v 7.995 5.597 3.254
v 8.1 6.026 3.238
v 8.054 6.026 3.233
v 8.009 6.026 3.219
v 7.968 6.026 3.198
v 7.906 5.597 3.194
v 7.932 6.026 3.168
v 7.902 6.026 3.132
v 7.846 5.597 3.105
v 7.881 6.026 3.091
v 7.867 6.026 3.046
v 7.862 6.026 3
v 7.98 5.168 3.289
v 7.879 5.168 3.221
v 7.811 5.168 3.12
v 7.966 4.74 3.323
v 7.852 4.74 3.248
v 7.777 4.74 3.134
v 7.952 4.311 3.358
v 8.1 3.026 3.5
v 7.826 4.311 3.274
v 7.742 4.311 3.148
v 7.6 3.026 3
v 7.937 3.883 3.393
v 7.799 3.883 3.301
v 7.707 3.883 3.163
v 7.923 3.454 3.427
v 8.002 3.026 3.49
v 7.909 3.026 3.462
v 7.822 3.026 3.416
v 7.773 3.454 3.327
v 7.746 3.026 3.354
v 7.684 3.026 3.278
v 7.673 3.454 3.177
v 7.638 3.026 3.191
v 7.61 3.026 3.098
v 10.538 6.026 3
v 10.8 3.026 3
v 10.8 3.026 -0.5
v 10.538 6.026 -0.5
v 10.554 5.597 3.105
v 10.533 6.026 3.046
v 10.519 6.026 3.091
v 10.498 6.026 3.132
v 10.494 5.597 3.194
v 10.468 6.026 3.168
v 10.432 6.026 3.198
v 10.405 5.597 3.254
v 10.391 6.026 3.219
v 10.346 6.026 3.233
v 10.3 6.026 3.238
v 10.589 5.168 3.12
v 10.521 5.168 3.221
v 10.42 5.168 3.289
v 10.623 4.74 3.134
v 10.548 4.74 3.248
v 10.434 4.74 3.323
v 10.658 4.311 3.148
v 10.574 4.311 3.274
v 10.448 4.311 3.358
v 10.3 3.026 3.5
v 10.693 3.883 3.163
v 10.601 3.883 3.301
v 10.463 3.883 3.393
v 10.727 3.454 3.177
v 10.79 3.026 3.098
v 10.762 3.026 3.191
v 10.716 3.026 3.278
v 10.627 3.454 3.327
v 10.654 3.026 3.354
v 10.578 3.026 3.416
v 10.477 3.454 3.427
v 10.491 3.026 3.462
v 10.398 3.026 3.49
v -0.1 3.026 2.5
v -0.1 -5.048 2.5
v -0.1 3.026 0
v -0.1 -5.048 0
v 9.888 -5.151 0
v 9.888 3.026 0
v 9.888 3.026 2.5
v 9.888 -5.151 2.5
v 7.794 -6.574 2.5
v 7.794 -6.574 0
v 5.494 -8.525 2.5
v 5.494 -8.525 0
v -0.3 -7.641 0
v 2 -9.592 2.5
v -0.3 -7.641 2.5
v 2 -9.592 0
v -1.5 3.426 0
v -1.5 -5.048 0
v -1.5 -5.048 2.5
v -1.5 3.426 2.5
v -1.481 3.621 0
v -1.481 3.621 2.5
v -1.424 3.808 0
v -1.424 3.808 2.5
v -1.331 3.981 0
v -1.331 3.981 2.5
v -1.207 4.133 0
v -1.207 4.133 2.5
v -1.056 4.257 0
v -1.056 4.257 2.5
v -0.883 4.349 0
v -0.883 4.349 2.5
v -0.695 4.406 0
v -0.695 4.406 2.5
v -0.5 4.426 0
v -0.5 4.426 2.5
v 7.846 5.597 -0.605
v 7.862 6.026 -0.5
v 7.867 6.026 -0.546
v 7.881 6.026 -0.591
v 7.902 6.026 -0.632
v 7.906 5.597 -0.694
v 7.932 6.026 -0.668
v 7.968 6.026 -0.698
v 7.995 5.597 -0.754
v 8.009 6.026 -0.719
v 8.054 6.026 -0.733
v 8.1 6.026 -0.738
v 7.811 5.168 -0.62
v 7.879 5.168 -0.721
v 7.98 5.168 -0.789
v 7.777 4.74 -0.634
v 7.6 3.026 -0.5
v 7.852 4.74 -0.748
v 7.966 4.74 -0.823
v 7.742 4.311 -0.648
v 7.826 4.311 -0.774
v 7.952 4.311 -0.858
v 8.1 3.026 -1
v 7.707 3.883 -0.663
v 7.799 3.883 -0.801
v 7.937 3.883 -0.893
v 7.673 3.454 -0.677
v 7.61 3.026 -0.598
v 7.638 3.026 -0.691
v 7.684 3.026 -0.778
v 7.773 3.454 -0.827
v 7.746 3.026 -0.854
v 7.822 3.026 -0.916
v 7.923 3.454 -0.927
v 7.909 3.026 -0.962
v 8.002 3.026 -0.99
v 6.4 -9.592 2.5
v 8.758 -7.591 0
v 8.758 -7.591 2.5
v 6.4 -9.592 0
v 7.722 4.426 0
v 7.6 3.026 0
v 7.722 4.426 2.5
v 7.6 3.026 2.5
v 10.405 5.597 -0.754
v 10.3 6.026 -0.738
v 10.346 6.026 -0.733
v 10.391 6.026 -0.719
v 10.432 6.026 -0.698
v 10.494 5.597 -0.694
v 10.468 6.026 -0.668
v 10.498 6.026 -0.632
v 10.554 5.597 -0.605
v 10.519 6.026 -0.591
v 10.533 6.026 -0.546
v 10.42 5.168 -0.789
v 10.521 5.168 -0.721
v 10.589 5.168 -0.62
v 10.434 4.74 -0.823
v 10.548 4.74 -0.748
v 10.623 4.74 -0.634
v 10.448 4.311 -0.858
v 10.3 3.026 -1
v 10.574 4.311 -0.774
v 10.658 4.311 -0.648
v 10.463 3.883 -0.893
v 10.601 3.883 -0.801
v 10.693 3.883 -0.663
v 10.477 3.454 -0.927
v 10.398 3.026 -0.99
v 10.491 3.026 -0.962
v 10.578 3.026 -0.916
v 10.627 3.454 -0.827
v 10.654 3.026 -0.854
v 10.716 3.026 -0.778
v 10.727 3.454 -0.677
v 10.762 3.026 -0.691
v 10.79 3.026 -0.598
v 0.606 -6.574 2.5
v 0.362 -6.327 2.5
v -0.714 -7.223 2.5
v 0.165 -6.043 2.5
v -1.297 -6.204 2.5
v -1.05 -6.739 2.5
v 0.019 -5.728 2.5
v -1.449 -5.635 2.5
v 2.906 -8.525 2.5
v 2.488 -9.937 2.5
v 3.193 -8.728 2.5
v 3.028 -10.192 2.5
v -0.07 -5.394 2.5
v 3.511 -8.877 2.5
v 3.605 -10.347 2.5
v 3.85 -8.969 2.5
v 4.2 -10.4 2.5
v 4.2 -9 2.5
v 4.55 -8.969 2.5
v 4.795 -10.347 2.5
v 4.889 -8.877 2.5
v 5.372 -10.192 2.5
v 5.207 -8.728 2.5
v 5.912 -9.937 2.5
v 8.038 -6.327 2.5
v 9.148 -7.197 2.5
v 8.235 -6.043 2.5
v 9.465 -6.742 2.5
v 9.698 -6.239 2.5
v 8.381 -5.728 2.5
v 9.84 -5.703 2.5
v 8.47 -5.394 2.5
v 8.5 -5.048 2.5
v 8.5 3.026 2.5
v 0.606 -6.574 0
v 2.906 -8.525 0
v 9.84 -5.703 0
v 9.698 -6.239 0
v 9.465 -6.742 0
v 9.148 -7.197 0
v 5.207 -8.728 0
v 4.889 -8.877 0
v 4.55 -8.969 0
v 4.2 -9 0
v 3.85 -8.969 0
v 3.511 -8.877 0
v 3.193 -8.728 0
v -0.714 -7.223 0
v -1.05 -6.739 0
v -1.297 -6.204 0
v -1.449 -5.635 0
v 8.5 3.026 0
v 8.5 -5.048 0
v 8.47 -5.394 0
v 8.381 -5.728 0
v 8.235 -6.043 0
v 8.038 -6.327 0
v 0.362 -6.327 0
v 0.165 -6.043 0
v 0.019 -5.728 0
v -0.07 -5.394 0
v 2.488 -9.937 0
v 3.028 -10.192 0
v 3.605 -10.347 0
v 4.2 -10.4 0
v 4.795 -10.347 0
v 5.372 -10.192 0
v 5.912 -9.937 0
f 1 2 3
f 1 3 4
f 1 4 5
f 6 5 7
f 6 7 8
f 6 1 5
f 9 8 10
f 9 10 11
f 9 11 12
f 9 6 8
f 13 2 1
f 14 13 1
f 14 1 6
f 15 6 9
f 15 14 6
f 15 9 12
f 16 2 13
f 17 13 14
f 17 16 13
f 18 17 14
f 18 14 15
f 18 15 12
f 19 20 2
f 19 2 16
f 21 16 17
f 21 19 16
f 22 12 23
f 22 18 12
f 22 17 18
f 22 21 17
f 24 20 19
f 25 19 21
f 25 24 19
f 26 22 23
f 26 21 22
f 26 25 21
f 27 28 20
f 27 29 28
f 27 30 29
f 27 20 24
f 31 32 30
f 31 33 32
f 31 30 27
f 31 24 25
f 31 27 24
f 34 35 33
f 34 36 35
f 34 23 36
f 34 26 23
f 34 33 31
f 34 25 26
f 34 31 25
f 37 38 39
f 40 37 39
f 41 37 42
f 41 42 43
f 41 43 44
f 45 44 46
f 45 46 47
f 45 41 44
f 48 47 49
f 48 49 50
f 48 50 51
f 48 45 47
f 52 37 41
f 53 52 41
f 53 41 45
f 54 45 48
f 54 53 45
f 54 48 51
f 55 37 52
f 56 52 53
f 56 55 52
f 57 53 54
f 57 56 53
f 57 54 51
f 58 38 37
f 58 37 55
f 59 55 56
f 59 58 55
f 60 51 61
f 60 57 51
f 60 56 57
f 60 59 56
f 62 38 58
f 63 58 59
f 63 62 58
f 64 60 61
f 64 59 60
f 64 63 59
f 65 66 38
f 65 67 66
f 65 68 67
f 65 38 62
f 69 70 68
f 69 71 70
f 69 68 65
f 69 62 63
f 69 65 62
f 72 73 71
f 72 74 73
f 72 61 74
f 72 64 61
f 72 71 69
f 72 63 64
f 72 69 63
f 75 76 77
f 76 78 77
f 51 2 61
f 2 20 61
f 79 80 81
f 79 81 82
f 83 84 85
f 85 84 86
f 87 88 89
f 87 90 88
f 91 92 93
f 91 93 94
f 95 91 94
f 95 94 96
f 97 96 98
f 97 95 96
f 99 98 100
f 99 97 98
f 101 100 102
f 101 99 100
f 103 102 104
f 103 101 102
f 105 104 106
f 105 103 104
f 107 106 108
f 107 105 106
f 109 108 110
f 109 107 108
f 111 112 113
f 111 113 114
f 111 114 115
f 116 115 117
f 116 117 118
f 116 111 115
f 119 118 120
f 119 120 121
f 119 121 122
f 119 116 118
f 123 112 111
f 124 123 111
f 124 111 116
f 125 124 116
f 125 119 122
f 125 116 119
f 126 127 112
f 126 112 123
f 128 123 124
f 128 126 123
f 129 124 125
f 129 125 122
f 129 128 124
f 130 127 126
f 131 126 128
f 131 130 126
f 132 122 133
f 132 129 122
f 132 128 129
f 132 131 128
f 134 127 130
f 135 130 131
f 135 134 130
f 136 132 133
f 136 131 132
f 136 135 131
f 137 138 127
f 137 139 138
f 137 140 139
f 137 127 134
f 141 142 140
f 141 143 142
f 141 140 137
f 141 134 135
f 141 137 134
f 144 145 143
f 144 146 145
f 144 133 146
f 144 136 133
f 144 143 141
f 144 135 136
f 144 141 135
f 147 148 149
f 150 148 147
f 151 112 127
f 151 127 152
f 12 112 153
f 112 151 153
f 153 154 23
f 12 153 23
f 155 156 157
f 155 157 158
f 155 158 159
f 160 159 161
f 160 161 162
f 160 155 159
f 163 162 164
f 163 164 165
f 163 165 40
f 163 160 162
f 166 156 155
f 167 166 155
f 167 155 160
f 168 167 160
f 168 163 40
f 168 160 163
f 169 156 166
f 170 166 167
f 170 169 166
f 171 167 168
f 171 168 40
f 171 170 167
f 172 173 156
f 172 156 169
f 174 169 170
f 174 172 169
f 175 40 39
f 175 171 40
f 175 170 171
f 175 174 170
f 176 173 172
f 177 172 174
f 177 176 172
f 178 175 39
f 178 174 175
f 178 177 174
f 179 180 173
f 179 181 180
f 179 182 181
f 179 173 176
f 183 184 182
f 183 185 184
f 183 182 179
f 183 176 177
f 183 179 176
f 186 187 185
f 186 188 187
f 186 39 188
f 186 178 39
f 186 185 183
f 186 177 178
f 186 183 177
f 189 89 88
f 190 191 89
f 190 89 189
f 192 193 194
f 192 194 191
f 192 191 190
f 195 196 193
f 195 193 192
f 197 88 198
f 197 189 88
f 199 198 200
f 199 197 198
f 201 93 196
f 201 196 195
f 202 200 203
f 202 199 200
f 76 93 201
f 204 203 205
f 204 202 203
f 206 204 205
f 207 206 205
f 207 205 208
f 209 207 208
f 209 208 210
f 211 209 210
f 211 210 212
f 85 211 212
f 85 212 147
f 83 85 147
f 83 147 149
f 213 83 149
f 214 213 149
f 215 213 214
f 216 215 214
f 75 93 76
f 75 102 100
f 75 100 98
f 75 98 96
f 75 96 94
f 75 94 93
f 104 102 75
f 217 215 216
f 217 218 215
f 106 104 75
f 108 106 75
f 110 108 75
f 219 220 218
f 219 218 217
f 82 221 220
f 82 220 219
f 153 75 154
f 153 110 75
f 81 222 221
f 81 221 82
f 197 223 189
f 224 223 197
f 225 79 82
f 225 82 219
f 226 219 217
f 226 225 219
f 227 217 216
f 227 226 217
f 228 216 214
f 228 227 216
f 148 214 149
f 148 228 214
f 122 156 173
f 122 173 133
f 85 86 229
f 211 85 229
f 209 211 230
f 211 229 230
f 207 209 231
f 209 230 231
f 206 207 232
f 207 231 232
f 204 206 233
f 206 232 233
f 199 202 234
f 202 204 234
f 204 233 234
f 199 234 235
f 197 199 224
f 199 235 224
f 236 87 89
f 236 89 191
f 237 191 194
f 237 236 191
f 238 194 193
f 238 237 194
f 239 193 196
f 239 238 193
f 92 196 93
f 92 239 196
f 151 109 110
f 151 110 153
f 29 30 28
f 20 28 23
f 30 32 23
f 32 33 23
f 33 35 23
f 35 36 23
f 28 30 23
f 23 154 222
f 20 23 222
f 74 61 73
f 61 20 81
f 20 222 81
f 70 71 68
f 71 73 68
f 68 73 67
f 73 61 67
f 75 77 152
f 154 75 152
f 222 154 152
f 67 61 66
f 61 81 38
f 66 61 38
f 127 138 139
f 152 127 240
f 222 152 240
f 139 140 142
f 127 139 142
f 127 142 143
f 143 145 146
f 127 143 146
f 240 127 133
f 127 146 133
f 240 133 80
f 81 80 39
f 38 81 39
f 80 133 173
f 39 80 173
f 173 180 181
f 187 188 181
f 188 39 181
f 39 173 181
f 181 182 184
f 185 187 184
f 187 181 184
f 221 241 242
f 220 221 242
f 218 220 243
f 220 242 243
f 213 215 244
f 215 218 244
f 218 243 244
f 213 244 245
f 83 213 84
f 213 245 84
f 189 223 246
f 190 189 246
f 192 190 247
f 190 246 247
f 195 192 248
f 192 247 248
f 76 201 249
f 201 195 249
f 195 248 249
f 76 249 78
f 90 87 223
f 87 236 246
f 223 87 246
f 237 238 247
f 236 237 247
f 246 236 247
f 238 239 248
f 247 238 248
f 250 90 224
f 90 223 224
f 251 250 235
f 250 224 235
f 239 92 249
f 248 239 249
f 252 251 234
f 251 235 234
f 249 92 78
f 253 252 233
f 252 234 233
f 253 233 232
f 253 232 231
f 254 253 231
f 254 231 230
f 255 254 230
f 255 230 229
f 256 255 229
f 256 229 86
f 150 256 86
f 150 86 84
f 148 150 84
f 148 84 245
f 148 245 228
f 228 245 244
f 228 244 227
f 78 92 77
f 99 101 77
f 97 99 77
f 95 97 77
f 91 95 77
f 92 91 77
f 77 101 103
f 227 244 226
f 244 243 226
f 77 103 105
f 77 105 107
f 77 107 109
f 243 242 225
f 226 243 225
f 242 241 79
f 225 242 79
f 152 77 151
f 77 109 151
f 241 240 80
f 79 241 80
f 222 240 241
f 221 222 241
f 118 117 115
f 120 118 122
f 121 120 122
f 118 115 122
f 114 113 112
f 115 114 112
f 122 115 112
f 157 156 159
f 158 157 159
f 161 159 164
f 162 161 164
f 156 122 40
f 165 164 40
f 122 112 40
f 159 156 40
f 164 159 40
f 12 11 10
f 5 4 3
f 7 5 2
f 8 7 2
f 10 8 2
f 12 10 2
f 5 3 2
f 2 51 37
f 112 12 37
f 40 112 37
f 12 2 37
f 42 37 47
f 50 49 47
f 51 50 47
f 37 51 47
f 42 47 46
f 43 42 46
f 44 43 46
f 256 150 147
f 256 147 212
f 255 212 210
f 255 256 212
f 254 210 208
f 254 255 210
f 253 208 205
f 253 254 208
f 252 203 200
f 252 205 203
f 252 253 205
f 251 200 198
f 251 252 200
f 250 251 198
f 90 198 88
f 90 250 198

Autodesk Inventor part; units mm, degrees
ref_plane "YZ Plane" through (0, 0, 0) normal (1, 0, 0) x (0, 1, 0)
ref_plane "XZ Plane" through (0, 0, 0) normal (0, 1, 0) x (-1, 0, 0)
ref_plane "XY Plane" through (0, 0, 0) normal (0, 0, 1) x (1, 0, 0)
sketch "Sketch1" plane through (0, 0, 0) normal (0, 0, 1) x (1, 0, 0)
  line L0 (-0.1, 3.0255) -> (8.5, 3.0255)
  line L1 (8.5, 3.0255) -> (8.5, -5.0485)
  line L2 (-0.1, -5.0485) -> (-0.1, 3.0255)
  arc A0 (2.9061, -8.525) -> (5.4939, -8.525) centre (4.2, -7) ccw
  line L3 (0.6061, -6.5735) -> (2.9061, -8.525)
  line L4 (7.7939, -6.5735) -> (5.4939, -8.525)
  arc A1 (-0.1, -5.0485) -> (0.6061, -6.5735) centre (1.9, -5.0485) ccw
  arc A2 (8.7584, -7.5913) -> (9.8881, -5.1512) centre (6.6881, -5.1512) ccw
  line L5 (8.7584, -7.5913) -> (6.3997, -9.5925)
  arc A3 (2.0003, -9.5925) -> (6.3997, -9.5925) centre (4.2, -7) ccw
  line L6 (2.0003, -9.5925) -> (-0.2997, -7.6411)
  arc A4 (-1.5, -5.0485) -> (-0.2997, -7.6411) centre (1.9, -5.0485) ccw
  line L7 (-1.5, -5.0485) -> (-1.5, 3.4255)
  line L8 (-0.5, 4.4255) -> (9.8881, 4.4255)
  line L9 (9.8881, 4.4255) -> (9.8881, -5.1512)
  arc A5 (-0.5, 4.4255) -> (-1.5, 3.4255) centre (-0.5, 3.4255) ccw
  arc A6 (7.7939, -6.5735) -> (8.5, -5.0485) centre (6.5, -5.0485) ccw
  point P0 (-0.1, -5.9745)
  dimension "d1" = 9
  dimension "d2" = 4
  dimension "d4" = 2
  dimension "d5" = 1.4
  dimension "d6" = 1
  dimension "d16" = 2
  dimension "d19" = 8.6
  dimension "d20" = 2.3
extrude "Extrusion1" add sketch "Sketch1" along normal blind 2.5
sketch "Sketch2" plane through (-0.1, 3.0255, 2.5) normal (0, -1, 0) x (1, 0, 0)
  line L0 (8.2, 1) -> (10.4, 1)
  line L1 (10.9, 0.5) -> (10.9, -3)
  line L2 (10.4, -3.5) -> (8.2, -3.5)
  line L3 (7.7, -3) -> (7.7, 0.5)
  arc A0 (8.2, 1) -> (7.7, 0.5) centre (8.2, 0.5) ccw
  arc A1 (10.9, 0.5) -> (10.4, 1) centre (10.4, 0.5) ccw
  arc A2 (10.4, -3.5) -> (10.9, -3) centre (10.4, -3) ccw
  arc A3 (7.7, -3) -> (8.2, -3.5) centre (8.2, -3) ccw
  line L4 (-1.4, -2.5) -> (-1.4, 0) projected
  point P0 (7.7, 1)
  point P1 (10.9, -3.5)
  point P2 (10.9, 1)
  dimension "d9" = 4.5
  dimension "d10" = 3.2
  dimension "d13" = 0.5
  dimension "d21" = 9.1
extrude "Extrusion2" add sketch "Sketch2" against normal blind 3 draft -5
properties part number "fastener_02"
